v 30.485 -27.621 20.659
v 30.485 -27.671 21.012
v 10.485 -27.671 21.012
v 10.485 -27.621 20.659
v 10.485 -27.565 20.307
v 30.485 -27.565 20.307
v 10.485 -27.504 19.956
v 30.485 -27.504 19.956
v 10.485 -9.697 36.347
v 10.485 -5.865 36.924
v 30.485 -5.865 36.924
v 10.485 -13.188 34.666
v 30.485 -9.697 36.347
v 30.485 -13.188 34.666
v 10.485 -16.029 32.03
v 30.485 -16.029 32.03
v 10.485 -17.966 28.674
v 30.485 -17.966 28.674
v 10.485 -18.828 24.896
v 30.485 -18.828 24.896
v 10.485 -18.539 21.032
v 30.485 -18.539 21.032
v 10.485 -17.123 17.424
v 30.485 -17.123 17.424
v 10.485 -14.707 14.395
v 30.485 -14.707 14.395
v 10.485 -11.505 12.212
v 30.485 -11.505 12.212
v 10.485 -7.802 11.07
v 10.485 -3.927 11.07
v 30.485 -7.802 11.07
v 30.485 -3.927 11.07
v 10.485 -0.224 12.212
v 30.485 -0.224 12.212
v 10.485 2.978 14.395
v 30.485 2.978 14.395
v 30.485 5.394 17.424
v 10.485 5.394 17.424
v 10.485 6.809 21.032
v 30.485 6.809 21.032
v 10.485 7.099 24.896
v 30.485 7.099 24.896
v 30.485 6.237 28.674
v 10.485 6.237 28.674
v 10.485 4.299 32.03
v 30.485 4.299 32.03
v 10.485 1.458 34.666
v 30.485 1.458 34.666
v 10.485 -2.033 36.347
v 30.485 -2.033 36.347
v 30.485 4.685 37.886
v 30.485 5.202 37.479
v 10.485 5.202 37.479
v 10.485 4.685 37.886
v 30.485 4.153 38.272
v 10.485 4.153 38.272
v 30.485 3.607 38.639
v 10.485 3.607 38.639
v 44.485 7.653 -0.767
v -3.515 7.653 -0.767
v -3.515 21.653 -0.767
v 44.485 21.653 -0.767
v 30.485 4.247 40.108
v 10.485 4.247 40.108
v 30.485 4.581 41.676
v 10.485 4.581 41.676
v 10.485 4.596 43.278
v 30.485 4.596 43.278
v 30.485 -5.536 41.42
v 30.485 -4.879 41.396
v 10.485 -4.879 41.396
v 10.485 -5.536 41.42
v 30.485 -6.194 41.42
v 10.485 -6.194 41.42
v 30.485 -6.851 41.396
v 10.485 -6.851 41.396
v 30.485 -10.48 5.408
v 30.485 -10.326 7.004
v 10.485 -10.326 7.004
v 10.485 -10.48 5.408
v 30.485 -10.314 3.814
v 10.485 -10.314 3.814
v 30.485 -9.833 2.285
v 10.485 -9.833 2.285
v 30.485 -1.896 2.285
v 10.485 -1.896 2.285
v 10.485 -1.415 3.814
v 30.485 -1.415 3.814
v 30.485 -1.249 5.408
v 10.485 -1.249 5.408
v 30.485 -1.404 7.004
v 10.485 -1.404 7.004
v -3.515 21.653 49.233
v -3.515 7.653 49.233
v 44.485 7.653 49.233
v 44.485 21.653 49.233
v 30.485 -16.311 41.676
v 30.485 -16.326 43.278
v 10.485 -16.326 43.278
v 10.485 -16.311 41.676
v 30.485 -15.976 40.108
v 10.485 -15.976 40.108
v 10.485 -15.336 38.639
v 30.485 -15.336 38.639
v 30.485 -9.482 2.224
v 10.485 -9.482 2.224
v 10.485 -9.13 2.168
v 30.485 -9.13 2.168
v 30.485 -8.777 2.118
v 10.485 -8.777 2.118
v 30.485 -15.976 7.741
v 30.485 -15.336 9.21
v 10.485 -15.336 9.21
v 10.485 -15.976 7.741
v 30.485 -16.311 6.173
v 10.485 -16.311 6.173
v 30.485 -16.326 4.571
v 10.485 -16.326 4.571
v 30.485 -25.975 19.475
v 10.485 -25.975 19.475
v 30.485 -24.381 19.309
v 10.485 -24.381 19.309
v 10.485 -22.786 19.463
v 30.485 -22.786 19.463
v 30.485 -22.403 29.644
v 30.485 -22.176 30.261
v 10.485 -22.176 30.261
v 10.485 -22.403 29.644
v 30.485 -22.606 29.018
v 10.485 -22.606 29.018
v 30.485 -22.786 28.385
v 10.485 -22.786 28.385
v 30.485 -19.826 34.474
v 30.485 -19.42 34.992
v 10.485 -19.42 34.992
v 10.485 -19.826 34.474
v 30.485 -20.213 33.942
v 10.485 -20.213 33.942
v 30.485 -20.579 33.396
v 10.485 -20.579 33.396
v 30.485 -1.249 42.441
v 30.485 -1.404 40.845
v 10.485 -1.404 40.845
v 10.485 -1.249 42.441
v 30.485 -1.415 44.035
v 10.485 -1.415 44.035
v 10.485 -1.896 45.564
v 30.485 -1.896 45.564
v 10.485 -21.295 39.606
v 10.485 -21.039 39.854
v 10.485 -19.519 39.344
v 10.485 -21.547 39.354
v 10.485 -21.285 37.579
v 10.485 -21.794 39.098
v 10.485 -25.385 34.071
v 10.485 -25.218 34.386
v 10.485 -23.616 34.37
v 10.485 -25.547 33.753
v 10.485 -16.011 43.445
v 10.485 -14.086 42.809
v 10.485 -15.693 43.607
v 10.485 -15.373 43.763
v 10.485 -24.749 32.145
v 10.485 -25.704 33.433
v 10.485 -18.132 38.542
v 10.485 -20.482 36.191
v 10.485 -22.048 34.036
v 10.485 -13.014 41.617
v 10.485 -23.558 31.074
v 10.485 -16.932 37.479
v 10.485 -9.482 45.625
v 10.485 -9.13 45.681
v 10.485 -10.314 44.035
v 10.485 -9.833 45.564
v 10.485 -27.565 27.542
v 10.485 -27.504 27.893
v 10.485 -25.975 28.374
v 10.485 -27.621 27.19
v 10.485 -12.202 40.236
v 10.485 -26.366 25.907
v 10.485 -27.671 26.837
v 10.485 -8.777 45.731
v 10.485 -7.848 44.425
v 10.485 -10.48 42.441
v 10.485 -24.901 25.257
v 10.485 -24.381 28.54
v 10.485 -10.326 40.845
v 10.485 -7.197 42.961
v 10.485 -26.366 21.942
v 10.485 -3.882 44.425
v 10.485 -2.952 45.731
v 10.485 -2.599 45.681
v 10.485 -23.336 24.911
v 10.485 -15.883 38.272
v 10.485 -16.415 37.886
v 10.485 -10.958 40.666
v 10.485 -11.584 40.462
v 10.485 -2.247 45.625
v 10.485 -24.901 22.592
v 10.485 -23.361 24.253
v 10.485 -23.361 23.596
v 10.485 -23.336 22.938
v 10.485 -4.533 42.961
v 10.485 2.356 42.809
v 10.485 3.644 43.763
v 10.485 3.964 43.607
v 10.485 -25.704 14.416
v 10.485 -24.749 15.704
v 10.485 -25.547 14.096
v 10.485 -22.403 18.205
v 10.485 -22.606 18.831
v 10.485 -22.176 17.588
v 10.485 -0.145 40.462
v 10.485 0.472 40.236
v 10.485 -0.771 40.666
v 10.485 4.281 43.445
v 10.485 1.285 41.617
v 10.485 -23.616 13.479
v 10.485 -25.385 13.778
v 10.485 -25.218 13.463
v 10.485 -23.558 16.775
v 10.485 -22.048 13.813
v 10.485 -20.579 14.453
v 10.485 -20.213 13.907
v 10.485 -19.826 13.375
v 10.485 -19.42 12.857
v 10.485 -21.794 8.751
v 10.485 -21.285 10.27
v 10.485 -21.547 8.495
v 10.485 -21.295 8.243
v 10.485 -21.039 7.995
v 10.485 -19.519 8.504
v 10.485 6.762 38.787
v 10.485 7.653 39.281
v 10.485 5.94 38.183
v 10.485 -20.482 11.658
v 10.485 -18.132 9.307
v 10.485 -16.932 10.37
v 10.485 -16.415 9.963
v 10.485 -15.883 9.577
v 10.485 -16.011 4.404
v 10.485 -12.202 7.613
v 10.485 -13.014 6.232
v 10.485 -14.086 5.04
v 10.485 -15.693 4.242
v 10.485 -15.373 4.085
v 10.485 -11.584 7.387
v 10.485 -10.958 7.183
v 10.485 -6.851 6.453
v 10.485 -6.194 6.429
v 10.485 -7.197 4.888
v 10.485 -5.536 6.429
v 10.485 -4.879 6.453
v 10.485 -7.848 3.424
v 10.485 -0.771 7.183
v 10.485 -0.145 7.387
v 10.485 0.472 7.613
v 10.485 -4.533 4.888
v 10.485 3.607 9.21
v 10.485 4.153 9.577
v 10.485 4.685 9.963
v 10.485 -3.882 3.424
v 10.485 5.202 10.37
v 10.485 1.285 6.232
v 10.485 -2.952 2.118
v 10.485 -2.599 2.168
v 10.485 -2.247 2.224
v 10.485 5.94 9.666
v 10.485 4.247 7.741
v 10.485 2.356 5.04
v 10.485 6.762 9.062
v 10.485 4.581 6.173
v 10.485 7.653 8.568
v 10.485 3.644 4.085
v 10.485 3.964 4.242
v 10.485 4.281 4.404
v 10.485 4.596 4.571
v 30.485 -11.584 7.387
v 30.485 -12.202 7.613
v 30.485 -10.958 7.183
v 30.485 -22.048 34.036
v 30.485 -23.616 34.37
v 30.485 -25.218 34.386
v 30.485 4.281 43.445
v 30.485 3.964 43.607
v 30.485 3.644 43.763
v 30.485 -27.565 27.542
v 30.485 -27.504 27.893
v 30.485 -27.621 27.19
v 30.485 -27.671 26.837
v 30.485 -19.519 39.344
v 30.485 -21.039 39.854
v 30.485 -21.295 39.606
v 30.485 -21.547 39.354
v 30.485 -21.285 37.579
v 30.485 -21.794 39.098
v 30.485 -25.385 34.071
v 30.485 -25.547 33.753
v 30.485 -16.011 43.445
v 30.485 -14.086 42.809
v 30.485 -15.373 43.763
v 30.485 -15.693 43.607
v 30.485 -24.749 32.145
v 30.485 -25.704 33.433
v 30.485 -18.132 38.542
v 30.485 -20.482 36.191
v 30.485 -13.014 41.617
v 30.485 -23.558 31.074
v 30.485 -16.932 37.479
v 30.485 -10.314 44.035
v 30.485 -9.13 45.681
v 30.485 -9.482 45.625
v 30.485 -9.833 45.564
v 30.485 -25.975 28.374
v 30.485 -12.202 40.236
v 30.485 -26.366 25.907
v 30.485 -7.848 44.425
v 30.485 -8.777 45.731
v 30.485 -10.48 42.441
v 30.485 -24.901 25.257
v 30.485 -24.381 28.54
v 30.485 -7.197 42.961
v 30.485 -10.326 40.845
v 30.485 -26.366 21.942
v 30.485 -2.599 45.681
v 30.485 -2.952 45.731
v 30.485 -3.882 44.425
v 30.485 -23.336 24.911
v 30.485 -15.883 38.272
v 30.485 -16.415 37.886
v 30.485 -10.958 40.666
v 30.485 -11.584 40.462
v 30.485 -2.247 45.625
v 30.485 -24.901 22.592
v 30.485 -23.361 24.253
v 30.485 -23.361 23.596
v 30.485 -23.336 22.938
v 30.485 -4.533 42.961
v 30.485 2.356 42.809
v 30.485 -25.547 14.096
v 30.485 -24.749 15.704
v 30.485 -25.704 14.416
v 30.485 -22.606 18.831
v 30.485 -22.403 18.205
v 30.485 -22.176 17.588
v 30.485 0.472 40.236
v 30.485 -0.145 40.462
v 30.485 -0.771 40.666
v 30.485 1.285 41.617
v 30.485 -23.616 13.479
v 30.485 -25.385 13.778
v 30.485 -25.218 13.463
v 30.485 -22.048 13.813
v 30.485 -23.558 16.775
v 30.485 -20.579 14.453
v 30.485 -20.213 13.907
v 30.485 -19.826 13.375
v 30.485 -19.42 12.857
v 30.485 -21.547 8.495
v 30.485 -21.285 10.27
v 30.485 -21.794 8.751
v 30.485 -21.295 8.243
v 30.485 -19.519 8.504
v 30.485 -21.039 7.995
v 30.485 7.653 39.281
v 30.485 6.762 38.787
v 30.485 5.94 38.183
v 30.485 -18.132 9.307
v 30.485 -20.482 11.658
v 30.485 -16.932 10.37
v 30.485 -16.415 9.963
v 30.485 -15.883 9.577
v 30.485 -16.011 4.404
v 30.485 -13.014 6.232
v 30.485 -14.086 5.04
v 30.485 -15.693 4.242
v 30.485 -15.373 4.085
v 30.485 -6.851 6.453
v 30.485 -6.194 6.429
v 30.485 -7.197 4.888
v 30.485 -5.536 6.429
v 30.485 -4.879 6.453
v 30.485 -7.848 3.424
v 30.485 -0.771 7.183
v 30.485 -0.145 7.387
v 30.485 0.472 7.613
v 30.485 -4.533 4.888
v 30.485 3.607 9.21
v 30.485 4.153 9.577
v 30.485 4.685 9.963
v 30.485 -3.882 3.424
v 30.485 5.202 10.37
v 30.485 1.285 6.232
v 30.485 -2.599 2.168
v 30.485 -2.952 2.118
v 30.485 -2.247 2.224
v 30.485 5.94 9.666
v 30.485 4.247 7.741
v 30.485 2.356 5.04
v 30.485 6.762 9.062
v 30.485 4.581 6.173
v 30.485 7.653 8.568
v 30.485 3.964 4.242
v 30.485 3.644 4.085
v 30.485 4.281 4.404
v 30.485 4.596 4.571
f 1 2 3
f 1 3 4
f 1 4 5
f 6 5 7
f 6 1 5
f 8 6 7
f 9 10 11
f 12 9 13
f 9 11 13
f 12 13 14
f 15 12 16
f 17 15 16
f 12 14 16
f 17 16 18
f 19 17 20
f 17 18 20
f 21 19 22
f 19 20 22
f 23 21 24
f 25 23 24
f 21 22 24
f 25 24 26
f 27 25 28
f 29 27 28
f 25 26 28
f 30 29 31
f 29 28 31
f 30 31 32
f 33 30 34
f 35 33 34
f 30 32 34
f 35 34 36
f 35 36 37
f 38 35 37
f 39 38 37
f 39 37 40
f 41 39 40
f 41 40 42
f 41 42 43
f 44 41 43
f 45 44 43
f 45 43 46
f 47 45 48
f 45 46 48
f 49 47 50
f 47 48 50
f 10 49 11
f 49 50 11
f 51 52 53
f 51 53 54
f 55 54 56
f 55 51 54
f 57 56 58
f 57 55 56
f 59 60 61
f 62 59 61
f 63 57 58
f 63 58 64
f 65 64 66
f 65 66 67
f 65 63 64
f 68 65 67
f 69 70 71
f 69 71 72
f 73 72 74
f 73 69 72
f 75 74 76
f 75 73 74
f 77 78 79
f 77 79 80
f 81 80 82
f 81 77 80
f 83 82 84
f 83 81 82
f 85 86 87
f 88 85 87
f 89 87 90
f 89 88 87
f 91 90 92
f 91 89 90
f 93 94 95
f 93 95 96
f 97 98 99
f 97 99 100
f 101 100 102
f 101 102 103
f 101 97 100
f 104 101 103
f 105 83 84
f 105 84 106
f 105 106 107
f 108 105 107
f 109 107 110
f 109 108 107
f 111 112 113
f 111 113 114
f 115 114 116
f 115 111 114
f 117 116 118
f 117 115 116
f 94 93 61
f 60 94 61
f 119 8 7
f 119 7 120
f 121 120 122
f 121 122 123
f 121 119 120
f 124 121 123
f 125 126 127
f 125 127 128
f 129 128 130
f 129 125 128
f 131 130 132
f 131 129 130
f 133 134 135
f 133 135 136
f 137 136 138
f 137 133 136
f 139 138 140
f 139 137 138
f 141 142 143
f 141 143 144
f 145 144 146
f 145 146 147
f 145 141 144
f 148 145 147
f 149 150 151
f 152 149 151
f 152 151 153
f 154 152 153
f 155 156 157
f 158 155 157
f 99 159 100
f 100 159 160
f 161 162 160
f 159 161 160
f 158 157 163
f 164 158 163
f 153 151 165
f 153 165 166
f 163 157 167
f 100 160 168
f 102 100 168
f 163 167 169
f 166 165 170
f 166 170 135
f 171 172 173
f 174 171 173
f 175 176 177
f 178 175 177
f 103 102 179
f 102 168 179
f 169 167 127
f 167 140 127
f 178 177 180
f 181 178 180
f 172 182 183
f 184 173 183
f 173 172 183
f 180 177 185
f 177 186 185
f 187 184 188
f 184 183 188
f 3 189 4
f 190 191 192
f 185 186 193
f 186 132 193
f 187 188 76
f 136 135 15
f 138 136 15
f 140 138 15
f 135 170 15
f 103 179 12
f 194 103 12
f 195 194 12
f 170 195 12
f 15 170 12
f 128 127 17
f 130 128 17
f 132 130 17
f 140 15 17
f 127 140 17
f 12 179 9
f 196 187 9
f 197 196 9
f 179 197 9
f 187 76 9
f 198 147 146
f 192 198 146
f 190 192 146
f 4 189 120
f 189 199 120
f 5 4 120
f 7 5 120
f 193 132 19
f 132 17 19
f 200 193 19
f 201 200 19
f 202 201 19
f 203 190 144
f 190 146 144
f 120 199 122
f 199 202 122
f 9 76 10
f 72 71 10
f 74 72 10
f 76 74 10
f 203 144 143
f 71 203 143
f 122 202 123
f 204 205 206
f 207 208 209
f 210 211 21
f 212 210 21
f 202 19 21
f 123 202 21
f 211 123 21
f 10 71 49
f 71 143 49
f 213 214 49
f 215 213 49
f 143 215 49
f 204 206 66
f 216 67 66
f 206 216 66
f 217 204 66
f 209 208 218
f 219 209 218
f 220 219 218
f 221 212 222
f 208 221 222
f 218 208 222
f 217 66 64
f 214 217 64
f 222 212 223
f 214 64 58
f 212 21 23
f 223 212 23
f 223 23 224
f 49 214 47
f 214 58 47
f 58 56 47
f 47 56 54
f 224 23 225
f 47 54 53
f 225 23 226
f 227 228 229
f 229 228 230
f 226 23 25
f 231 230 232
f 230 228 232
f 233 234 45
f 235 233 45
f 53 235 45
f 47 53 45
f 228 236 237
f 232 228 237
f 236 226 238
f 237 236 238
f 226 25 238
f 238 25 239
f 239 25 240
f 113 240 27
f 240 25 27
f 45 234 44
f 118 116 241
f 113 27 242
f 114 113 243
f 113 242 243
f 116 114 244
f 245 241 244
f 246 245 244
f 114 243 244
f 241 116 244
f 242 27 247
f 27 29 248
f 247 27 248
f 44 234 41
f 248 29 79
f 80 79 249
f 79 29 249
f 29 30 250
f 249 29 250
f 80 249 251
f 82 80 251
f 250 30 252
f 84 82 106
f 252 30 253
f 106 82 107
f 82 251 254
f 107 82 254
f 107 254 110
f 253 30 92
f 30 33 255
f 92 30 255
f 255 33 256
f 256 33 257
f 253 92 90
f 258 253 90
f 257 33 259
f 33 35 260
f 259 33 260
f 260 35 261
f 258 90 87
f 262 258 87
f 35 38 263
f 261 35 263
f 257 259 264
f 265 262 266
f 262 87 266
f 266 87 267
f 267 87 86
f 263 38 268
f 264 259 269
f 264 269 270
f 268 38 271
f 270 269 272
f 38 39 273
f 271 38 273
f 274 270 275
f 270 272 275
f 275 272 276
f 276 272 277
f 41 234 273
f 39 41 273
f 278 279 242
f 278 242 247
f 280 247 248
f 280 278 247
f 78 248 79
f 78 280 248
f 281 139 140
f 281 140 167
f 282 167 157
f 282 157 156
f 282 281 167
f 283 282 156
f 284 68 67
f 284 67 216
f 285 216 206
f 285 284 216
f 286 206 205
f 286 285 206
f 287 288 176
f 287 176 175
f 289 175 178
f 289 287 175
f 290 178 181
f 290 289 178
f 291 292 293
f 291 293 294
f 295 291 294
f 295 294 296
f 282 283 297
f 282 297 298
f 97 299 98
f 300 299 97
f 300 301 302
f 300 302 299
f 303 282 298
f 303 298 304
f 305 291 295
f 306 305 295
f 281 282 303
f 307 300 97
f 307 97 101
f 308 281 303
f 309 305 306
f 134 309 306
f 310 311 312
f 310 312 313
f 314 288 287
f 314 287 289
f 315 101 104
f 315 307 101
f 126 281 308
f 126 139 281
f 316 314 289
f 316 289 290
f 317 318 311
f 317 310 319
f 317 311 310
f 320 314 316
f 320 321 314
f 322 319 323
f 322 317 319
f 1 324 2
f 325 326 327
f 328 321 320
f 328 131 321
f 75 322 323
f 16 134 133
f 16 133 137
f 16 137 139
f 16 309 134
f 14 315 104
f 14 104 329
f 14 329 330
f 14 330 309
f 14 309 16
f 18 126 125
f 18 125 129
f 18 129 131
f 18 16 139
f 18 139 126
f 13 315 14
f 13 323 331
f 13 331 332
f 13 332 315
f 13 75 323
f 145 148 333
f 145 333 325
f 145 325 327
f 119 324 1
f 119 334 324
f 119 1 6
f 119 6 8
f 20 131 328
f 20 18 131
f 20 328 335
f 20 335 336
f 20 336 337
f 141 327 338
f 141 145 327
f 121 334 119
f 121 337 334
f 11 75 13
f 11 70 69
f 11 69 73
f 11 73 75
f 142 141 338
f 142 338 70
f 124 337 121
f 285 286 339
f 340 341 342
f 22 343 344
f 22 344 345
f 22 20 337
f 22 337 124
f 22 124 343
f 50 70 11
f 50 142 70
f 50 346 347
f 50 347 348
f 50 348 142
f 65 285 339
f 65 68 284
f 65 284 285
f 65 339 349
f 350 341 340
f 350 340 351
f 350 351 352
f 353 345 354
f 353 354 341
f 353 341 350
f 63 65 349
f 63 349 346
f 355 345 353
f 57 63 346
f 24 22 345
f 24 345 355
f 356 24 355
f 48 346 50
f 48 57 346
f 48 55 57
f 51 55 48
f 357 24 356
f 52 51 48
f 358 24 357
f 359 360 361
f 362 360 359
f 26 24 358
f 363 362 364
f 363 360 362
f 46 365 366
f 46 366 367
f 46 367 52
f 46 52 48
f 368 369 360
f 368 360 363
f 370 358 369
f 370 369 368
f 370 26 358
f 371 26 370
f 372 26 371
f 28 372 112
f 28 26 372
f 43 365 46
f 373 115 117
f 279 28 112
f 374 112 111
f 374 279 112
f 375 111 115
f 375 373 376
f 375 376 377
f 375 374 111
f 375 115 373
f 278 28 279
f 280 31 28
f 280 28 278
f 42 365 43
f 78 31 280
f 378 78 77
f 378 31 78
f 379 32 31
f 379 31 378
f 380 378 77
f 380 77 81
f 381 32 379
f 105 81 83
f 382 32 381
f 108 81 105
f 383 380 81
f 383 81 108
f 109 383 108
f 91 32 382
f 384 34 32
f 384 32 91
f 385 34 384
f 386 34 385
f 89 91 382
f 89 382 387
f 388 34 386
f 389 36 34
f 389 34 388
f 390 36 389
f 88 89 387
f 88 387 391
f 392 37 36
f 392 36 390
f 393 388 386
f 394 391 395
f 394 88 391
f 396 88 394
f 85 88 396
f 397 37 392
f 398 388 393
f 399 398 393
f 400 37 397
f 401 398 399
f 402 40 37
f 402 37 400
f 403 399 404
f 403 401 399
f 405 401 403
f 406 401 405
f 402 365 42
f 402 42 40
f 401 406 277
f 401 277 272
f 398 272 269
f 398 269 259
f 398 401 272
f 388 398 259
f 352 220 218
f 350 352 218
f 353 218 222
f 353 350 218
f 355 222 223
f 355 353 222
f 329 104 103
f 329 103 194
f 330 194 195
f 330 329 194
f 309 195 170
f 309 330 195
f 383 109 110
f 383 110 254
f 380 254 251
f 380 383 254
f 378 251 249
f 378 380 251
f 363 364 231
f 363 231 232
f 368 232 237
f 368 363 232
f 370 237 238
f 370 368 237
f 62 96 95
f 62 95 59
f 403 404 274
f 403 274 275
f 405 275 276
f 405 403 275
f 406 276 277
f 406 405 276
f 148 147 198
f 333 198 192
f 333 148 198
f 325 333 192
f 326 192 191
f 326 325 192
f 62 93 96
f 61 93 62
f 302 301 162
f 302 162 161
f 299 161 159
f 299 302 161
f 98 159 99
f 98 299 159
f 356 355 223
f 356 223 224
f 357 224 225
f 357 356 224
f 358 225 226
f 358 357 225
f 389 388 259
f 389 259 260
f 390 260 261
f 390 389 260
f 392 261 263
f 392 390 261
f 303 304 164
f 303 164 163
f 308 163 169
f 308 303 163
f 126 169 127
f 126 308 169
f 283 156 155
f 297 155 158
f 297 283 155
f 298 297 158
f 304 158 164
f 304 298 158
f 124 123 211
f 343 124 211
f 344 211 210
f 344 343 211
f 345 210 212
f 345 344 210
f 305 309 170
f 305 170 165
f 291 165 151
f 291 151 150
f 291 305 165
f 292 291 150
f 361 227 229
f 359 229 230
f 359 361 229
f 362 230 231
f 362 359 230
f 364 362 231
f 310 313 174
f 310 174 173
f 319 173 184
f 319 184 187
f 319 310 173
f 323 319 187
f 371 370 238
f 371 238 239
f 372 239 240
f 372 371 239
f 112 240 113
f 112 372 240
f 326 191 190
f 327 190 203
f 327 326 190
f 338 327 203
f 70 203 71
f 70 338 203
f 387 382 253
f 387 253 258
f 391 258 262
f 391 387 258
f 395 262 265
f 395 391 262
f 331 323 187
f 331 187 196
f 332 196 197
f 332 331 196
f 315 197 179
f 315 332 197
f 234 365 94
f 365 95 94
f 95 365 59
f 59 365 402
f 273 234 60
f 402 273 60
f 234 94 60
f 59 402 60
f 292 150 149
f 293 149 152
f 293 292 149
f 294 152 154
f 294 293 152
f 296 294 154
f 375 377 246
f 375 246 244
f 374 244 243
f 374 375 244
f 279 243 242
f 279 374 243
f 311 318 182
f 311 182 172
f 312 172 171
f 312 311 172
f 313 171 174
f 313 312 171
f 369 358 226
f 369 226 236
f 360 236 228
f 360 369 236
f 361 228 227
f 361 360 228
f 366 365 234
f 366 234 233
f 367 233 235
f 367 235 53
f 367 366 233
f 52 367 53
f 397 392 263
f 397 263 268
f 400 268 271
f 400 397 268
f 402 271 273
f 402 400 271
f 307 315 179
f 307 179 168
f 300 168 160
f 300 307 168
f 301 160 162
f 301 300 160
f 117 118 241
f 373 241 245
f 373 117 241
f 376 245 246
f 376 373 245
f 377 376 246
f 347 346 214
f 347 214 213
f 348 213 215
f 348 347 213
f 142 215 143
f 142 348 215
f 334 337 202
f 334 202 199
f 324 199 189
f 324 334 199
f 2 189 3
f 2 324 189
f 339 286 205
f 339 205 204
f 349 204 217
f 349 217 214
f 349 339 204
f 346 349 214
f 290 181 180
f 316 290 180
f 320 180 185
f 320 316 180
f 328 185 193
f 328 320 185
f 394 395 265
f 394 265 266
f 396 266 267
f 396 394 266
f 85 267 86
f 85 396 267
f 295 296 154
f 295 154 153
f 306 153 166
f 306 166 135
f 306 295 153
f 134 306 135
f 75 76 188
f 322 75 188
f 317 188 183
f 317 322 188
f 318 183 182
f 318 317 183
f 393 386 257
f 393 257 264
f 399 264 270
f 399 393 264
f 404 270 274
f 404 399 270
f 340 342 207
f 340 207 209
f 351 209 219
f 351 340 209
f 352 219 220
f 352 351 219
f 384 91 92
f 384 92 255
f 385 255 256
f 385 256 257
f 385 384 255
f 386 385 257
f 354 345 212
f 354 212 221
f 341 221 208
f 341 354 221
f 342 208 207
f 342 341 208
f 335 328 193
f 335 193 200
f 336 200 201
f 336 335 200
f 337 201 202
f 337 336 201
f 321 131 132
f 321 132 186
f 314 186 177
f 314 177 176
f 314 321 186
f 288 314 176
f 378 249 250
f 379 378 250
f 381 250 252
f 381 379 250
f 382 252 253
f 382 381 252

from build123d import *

# Parameters (mm, degrees)
SKETCH1_R                = 13
BOSS_EXTRUDE1_DEPTH      = 20
BOSS_EXTRUDE2_DEPTH      = 14
BOSS_EXTRUDE2_DEPTH_BACK = 34
SKETCH2_W                = 50
SKETCH2_H                = 14


with BuildPart() as part:
    # Sketch1 → Boss-Extrude1 (new body)
    with BuildSketch(Plane(origin=(30.485241984, 0, 0), x_dir=(0, 0, -1), z_dir=(1, 0, 0))):
        with BuildLine():
            ThreePointArc((-45.730813467, -2.952037332), (-43.709327628, -4.244029096), (-41.395669142, -4.878562094))
            ThreePointArc((-41.395669142, -4.878562094), (-41.423479526, -5.864733686), (-41.395669142, -6.850905277))
            ThreePointArc((-41.395669142, -6.850905277), (-43.709327628, -7.485438275), (-45.730813467, -8.777430039))
            ThreePointArc((-45.730813467, -8.777430039), (-45.653623019, -9.306291917), (-45.56360819, -9.833122612))
            ThreePointArc((-45.56360819, -9.833122612), (-43.241813498, -10.43720632), (-40.845312039, -10.325723271))
            ThreePointArc((-40.845312039, -10.325723271), (-40.567017505, -11.27222207), (-40.235824477, -12.201533107))
            ThreePointArc((-40.235824477, -12.201533107), (-42.240162977, -13.519969641), (-43.763462845, -15.373400306))
            ThreePointArc((-43.763462845, -15.373400306), (-43.526623058, -15.85252468), (-43.278214231, -16.325754333))
            ThreePointArc((-43.278214231, -16.325754333), (-40.883384128, -16.182798063), (-38.638625955, -15.336211705))
            ThreePointArc((-38.638625955, -15.336211705), (-38.081467911, -16.150387816), (-37.47931172, -16.931870859))
            ThreePointArc((-37.47931172, -16.931870859), (-38.978131616, -18.805153175), (-39.854134309, -21.038596032))
            ThreePointArc((-39.854134309, -21.038596032), (-39.480828712, -21.421082872), (-39.098341873, -21.794388468))
            ThreePointArc((-39.098341873, -21.794388468), (-36.864899015, -20.918385775), (-34.991616699, -19.419565879))
            ThreePointArc((-34.991616699, -19.419565879), (-34.210133656, -20.02172207), (-33.395957546, -20.578880114))
            ThreePointArc((-33.395957546, -20.578880114), (-34.242543904, -22.823638287), (-34.385500174, -25.21846839))
            ThreePointArc((-34.385500174, -25.21846839), (-33.91227052, -25.466877218), (-33.433146146, -25.703717004))
            ThreePointArc((-33.433146146, -25.703717004), (-31.579715481, -24.180417136), (-30.261278947, -22.176078636))
            ThreePointArc((-30.261278947, -22.176078636), (-29.331967911, -22.507271664), (-28.385469111, -22.785566198))
            ThreePointArc((-28.385469111, -22.785566198), (-28.49695216, -25.182067658), (-27.892868452, -27.50386235))
            ThreePointArc((-27.892868452, -27.50386235), (-27.366037757, -27.593877179), (-26.83717588, -27.671067627))
            ThreePointArc((-26.83717588, -27.671067627), (-25.545184115, -25.649581788), (-24.910651117, -23.335923302))
            ThreePointArc((-24.910651117, -23.335923302), (-23.924479526, -23.363733686), (-22.938307935, -23.335923302))
            ThreePointArc((-22.938307935, -23.335923302), (-22.303774937, -25.649581788), (-21.011783173, -27.671067627))
            ThreePointArc((-21.011783173, -27.671067627), (-20.482921295, -27.593877179), (-19.9560906, -27.50386235))
            ThreePointArc((-19.9560906, -27.50386235), (-19.352006892, -25.182067658), (-19.463489941, -22.785566198))
            ThreePointArc((-19.463489941, -22.785566198), (-18.516991142, -22.507271664), (-17.587680105, -22.176078636))
            ThreePointArc((-17.587680105, -22.176078636), (-16.269243571, -24.180417136), (-14.415812906, -25.703717004))
            ThreePointArc((-14.415812906, -25.703717004), (-13.936688532, -25.466877218), (-13.463458878, -25.21846839))
            ThreePointArc((-13.463458878, -25.21846839), (-13.606415149, -22.823638287), (-14.453001507, -20.578880114))
            ThreePointArc((-14.453001507, -20.578880114), (-13.638825396, -20.02172207), (-12.857342353, -19.419565879))
            ThreePointArc((-12.857342353, -19.419565879), (-10.984060037, -20.918385775), (-8.75061718, -21.794388468))
            ThreePointArc((-8.75061718, -21.794388468), (-8.36813034, -21.421082872), (-7.994824744, -21.038596032))
            ThreePointArc((-7.994824744, -21.038596032), (-8.870827436, -18.805153175), (-10.369647333, -16.931870859))
            ThreePointArc((-10.369647333, -16.931870859), (-9.767491142, -16.150387816), (-9.210333097, -15.336211705))
            ThreePointArc((-9.210333097, -15.336211705), (-6.965574925, -16.182798063), (-4.570744822, -16.325754333))
            ThreePointArc((-4.570744822, -16.325754333), (-4.322335994, -15.85252468), (-4.085496208, -15.373400306))
            ThreePointArc((-4.085496208, -15.373400306), (-5.608796076, -13.519969641), (-7.613134576, -12.201533107))
            ThreePointArc((-7.613134576, -12.201533107), (-7.281941548, -11.27222207), (-7.003647014, -10.325723271))
            ThreePointArc((-7.003647014, -10.325723271), (-4.607145554, -10.43720632), (-2.285350862, -9.833122612))
            ThreePointArc((-2.285350862, -9.833122612), (-2.195336033, -9.306291917), (-2.118145585, -8.777430039))
            ThreePointArc((-2.118145585, -8.777430039), (-4.139631424, -7.485438275), (-6.45328991, -6.850905277))
            ThreePointArc((-6.45328991, -6.850905277), (-6.425479526, -5.864733686), (-6.45328991, -4.878562094))
            ThreePointArc((-6.45328991, -4.878562094), (-4.139631424, -4.244029096), (-2.118145585, -2.952037332))
            ThreePointArc((-2.118145585, -2.952037332), (-2.195336033, -2.423175455), (-2.285350862, -1.89634476))
            ThreePointArc((-2.285350862, -1.89634476), (-4.607145554, -1.292261052), (-7.003647014, -1.403744101))
            ThreePointArc((-7.003647014, -1.403744101), (-7.281941548, -0.457245301), (-7.613134576, 0.472065736))
            ThreePointArc((-7.613134576, 0.472065736), (-5.608796076, 1.79050227), (-4.085496208, 3.643932934))
            ThreePointArc((-4.085496208, 3.643932934), (-4.322335994, 4.123057309), (-4.570744822, 4.596286962))
            ThreePointArc((-4.570744822, 4.596286962), (-6.965574925, 4.453330692), (-9.210333097, 3.606744334))
            ThreePointArc((-9.210333097, 3.606744334), (-9.767491142, 4.420920444), (-10.369647333, 5.202403487))
            ThreePointArc((-10.369647333, 5.202403487), (-8.870827436, 7.075685803), (-7.994824744, 9.309128661))
            ThreePointArc((-7.994824744, 9.309128661), (-8.36813034, 9.6916155), (-8.75061718, 10.064921097))
            ThreePointArc((-8.75061718, 10.064921097), (-10.984060037, 9.188918404), (-12.857342353, 7.690098508))
            ThreePointArc((-12.857342353, 7.690098508), (-13.638825396, 8.292254699), (-14.453001507, 8.849412743))
            ThreePointArc((-14.453001507, 8.849412743), (-13.606415149, 11.094170916), (-13.463458878, 13.489001019))
            ThreePointArc((-13.463458878, 13.489001019), (-13.936688532, 13.737409846), (-14.415812906, 13.974249633))
            ThreePointArc((-14.415812906, 13.974249633), (-16.269243571, 12.450949765), (-17.587680105, 10.446611265))
            ThreePointArc((-17.587680105, 10.446611265), (-18.516991142, 10.777804293), (-19.463489941, 11.056098827))
            ThreePointArc((-19.463489941, 11.056098827), (-19.352006892, 13.452600287), (-19.9560906, 15.774394978))
            ThreePointArc((-19.9560906, 15.774394978), (-20.482921295, 15.864409807), (-21.011783173, 15.941600255))
            ThreePointArc((-21.011783173, 15.941600255), (-22.303774937, 13.920114416), (-22.938307935, 11.60645593))
            ThreePointArc((-22.938307935, 11.60645593), (-23.924479526, 11.634266314), (-24.910651117, 11.60645593))
            ThreePointArc((-24.910651117, 11.60645593), (-25.545184115, 13.920114416), (-26.83717588, 15.941600255))
            ThreePointArc((-26.83717588, 15.941600255), (-27.366037757, 15.864409807), (-27.892868452, 15.774394978))
            ThreePointArc((-27.892868452, 15.774394978), (-28.49695216, 13.452600287), (-28.385469111, 11.056098827))
            ThreePointArc((-28.385469111, 11.056098827), (-29.331967911, 10.777804293), (-30.261278947, 10.446611265))
            ThreePointArc((-30.261278947, 10.446611265), (-31.579715481, 12.450949765), (-33.433146146, 13.974249633))
            ThreePointArc((-33.433146146, 13.974249633), (-33.91227052, 13.737409846), (-34.385500174, 13.489001019))
            ThreePointArc((-34.385500174, 13.489001019), (-34.242543904, 11.094170916), (-33.395957546, 8.849412743))
            ThreePointArc((-33.395957546, 8.849412743), (-34.210133656, 8.292254699), (-34.991616699, 7.690098508))
            ThreePointArc((-34.991616699, 7.690098508), (-36.864899015, 9.188918404), (-39.098341873, 10.064921097))
            ThreePointArc((-39.098341873, 10.064921097), (-39.480828712, 9.6916155), (-39.854134309, 9.309128661))
            ThreePointArc((-39.854134309, 9.309128661), (-38.978131616, 7.075685803), (-37.47931172, 5.202403487))
            ThreePointArc((-37.47931172, 5.202403487), (-38.081467911, 4.420920444), (-38.638625955, 3.606744334))
            ThreePointArc((-38.638625955, 3.606744334), (-40.883384128, 4.453330692), (-43.278214231, 4.596286962))
            ThreePointArc((-43.278214231, 4.596286962), (-43.526623058, 4.123057309), (-43.763462845, 3.643932934))
            ThreePointArc((-43.763462845, 3.643932934), (-42.240162977, 1.79050227), (-40.235824477, 0.472065736))
            ThreePointArc((-40.235824477, 0.472065736), (-40.567017505, -0.457245301), (-40.845312039, -1.403744101))
            ThreePointArc((-40.845312039, -1.403744101), (-43.241813498, -1.292261052), (-45.56360819, -1.89634476))
            ThreePointArc((-45.56360819, -1.89634476), (-45.653623019, -2.423175455), (-45.730813467, -2.952037332))
        make_face()
        with Locations(Location((-23.924479526, -5.864733686, 0), (0, 0, 180))):
            Circle(SKETCH1_R, mode=Mode.SUBTRACT)
    extrude(amount=-BOSS_EXTRUDE1_DEPTH)

    # Sketch2 → Boss-Extrude2 (add, two sides: drawn at the far end of the back side and taken through both)
    with BuildSketch(Plane(origin=(30.485241984, 0, 0), x_dir=(0, 0, -1), z_dir=(1, 0, 0)).offset(-BOSS_EXTRUDE2_DEPTH_BACK)):
        with Locations((-24.233465749, 14.653188973)):
            Rectangle(SKETCH2_W, SKETCH2_H)
    extrude(amount=BOSS_EXTRUDE2_DEPTH + BOSS_EXTRUDE2_DEPTH_BACK)


solid = part.part
